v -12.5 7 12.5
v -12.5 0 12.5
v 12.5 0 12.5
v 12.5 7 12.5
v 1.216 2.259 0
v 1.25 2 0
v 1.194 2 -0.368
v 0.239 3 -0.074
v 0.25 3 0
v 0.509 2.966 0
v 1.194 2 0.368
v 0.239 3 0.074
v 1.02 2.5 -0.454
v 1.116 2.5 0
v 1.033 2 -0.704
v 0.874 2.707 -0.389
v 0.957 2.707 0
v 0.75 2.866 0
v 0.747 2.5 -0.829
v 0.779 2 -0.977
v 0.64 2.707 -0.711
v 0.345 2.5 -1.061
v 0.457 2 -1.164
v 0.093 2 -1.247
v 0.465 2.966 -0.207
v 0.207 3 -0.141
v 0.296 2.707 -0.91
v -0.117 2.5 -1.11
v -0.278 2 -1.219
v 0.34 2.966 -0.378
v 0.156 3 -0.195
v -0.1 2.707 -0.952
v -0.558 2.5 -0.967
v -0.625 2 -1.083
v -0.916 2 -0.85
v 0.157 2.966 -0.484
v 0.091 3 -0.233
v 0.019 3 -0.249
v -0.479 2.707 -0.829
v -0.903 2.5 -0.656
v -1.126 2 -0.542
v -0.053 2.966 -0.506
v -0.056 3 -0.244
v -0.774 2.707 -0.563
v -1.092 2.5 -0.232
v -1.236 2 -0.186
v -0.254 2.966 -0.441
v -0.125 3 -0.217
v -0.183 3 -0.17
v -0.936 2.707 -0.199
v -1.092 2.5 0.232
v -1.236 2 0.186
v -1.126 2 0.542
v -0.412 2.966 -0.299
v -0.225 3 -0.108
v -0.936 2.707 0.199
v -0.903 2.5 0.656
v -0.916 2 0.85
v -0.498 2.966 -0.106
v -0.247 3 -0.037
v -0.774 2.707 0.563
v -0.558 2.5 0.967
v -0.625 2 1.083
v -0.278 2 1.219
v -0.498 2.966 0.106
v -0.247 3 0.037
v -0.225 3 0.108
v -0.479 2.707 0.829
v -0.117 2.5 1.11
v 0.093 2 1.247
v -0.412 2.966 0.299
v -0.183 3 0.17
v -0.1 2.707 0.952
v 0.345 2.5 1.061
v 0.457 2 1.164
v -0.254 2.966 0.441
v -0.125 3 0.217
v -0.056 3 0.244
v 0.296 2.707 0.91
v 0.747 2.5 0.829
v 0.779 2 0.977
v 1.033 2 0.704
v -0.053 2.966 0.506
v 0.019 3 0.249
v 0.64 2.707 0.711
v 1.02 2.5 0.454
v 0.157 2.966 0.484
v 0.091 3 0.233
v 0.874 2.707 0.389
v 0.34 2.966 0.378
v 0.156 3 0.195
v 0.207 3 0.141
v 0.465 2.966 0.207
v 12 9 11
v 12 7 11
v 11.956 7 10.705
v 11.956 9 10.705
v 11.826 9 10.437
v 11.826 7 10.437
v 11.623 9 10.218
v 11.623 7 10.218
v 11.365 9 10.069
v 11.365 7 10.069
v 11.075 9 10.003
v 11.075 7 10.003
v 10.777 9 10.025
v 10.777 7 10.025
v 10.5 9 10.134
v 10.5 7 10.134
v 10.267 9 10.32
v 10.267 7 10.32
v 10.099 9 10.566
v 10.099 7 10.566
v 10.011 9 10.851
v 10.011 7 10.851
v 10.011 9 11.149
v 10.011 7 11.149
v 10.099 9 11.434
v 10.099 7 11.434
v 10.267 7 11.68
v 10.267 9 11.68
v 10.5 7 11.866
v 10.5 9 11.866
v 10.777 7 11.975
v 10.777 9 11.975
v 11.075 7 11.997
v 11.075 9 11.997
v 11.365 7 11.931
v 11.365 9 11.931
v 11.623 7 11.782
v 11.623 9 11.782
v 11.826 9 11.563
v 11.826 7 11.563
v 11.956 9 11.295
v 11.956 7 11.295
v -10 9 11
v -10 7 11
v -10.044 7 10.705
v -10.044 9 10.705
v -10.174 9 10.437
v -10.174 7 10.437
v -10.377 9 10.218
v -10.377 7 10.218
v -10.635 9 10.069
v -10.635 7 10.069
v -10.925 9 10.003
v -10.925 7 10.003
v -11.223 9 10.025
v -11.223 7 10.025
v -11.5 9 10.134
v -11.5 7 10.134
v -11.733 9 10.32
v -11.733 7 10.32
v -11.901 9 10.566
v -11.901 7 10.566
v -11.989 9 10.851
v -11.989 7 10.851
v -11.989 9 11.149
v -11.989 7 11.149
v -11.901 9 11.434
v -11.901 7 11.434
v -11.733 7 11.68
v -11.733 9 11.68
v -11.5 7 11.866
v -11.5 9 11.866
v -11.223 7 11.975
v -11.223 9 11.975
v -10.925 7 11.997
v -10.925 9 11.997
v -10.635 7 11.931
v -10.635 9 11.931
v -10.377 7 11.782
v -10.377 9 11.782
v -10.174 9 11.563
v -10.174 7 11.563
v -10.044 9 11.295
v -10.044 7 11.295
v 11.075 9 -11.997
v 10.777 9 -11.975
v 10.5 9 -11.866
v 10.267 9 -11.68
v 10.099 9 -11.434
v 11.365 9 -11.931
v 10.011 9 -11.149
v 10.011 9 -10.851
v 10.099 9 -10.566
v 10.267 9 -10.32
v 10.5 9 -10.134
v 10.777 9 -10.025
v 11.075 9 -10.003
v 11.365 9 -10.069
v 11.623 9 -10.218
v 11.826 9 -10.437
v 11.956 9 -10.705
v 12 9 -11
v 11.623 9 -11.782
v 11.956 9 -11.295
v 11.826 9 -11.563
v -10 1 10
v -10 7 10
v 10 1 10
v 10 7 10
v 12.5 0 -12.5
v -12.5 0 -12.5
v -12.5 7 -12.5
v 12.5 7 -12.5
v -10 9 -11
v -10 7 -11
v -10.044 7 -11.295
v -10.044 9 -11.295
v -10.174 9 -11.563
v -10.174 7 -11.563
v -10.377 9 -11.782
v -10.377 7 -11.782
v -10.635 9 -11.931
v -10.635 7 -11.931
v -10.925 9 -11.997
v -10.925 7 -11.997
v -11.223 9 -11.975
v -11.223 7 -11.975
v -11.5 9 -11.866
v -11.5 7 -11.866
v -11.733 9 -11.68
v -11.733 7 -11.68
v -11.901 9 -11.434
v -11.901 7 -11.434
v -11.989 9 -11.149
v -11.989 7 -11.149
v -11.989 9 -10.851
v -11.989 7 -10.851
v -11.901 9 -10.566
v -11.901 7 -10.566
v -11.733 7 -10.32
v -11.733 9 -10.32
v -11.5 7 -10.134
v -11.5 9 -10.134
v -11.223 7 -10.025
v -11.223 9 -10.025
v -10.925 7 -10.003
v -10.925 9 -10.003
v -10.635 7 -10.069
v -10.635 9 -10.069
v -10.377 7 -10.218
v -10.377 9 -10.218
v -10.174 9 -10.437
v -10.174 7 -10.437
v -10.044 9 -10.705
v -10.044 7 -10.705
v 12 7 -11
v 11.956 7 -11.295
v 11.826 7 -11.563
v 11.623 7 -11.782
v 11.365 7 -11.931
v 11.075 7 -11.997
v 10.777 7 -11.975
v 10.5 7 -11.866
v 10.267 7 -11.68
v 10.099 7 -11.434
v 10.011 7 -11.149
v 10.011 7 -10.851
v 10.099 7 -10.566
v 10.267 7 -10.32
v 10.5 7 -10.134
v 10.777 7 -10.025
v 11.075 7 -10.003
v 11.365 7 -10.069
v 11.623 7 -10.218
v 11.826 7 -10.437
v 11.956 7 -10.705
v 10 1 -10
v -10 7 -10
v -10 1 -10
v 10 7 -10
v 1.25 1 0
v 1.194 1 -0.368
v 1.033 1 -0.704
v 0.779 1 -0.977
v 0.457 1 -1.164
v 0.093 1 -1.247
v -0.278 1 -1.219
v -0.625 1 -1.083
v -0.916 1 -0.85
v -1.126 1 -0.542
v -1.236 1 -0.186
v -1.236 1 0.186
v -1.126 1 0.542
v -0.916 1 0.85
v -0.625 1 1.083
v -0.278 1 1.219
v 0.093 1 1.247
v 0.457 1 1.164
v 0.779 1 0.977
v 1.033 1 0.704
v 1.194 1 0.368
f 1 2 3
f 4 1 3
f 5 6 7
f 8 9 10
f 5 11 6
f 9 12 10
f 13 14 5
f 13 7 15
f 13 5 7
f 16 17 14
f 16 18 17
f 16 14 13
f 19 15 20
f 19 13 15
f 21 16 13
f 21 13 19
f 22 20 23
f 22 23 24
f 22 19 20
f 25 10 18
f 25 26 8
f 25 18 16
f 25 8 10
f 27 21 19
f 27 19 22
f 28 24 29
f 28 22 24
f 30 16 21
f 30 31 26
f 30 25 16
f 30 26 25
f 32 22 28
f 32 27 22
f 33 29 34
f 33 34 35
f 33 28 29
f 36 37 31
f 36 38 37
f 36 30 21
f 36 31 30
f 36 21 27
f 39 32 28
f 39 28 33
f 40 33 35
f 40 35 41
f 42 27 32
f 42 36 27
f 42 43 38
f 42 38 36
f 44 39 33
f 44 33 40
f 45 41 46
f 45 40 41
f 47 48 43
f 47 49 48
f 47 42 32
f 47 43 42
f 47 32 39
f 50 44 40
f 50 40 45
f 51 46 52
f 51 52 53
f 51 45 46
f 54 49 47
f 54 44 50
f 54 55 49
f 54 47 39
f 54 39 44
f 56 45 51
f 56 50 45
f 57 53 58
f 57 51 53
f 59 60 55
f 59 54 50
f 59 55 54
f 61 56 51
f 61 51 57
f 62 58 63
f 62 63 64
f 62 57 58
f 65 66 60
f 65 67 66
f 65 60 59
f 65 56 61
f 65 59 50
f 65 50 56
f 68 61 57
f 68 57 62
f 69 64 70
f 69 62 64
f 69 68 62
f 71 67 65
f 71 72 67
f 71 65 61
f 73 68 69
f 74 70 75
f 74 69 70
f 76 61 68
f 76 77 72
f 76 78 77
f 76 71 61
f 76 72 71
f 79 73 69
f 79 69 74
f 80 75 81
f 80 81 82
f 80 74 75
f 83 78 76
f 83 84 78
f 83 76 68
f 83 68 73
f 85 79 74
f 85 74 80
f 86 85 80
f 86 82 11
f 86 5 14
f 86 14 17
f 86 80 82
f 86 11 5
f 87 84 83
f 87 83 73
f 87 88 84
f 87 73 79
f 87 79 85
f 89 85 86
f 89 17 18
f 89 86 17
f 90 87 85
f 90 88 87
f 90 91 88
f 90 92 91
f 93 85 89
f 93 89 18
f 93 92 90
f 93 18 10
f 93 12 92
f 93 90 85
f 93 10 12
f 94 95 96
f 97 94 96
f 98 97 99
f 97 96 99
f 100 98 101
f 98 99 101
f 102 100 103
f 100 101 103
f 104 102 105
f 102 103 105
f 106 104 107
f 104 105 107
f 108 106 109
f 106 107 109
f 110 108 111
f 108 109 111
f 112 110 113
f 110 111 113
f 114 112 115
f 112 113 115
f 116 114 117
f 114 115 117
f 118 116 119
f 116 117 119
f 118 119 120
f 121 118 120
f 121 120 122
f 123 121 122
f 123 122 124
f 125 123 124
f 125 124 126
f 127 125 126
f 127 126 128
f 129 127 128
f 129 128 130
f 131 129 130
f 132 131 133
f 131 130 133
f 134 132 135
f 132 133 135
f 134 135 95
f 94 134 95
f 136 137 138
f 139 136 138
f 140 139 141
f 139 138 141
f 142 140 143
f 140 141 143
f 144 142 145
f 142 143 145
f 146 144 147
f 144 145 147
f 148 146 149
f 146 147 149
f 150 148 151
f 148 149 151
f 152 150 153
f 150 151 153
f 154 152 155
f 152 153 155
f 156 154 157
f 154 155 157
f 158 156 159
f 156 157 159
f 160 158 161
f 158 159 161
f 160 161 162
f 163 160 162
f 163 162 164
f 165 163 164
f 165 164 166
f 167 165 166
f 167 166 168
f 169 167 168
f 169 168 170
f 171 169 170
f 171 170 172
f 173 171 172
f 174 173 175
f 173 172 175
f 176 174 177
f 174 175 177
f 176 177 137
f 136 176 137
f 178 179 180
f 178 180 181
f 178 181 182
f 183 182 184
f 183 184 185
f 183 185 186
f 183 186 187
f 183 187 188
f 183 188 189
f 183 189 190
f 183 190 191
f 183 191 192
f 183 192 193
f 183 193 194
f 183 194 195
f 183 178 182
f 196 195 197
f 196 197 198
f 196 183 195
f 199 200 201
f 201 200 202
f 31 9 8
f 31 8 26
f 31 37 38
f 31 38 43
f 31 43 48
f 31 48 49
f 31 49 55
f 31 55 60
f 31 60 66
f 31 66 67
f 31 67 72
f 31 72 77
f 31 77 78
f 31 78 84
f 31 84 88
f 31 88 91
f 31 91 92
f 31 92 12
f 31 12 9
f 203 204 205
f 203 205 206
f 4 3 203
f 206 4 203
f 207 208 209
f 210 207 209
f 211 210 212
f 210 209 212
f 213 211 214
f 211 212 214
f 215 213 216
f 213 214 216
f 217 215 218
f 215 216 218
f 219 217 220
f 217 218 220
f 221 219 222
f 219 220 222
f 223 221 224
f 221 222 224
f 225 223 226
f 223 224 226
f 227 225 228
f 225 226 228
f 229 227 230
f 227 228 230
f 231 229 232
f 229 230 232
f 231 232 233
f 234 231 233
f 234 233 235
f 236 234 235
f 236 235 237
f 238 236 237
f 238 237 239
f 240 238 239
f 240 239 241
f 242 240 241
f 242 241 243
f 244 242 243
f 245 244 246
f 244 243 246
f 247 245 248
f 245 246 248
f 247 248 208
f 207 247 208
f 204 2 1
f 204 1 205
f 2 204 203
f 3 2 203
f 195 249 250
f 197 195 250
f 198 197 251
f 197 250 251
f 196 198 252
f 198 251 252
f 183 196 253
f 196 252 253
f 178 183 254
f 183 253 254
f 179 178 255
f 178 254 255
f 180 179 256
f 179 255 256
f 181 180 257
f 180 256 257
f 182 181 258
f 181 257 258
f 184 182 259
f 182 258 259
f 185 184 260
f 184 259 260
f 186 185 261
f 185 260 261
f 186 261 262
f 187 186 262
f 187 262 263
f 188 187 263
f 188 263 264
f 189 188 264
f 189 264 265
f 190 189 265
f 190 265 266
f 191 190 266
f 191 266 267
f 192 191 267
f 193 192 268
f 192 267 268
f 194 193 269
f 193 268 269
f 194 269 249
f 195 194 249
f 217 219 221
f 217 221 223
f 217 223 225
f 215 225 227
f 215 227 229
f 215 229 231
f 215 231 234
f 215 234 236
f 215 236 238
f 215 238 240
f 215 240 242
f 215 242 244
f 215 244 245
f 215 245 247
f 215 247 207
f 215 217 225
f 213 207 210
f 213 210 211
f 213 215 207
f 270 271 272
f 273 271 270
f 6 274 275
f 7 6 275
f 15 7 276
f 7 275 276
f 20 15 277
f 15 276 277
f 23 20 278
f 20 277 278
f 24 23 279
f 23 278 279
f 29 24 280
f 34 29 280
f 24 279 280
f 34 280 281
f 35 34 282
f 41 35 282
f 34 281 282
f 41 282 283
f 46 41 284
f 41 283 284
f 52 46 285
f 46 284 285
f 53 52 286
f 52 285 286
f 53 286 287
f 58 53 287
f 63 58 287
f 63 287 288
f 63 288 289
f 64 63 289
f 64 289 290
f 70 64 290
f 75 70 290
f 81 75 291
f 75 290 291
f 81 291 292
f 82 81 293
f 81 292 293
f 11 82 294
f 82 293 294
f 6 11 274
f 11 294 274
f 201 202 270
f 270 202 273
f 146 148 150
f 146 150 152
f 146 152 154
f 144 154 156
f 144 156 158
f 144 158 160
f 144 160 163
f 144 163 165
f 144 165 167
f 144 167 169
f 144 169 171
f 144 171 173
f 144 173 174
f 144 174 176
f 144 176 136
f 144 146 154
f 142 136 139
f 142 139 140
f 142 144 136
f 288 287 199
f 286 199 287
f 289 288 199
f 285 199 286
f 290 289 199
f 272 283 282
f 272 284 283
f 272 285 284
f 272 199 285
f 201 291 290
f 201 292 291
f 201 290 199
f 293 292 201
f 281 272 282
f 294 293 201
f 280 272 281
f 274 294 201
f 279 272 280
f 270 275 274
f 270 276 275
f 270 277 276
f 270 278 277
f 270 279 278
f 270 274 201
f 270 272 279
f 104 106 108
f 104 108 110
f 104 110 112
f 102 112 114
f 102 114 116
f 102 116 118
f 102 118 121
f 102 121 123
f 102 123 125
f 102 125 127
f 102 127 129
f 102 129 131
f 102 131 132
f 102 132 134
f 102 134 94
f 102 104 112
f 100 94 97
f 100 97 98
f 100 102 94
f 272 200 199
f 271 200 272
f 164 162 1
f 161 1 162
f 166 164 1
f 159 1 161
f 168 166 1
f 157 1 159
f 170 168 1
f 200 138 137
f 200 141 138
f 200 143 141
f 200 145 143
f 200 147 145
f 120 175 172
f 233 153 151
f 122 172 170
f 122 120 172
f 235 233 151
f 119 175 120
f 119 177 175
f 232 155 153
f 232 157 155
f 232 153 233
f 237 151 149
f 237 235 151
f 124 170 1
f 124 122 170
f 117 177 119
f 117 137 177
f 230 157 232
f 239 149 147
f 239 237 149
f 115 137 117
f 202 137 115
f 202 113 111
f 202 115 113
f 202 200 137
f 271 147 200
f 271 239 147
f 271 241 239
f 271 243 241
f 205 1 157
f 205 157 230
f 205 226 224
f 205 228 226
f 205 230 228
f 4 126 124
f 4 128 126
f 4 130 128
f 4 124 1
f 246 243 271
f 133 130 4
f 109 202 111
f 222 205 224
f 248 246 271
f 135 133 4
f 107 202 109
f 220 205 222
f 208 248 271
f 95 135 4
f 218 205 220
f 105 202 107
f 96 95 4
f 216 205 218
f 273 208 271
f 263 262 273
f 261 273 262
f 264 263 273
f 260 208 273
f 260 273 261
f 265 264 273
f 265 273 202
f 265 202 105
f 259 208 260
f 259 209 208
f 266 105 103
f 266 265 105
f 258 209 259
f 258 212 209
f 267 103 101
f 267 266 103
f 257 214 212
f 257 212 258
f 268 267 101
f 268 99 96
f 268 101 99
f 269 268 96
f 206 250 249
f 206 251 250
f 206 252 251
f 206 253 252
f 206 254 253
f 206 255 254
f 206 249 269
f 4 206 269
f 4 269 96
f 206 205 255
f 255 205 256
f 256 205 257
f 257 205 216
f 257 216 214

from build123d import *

# Parameters (mm, degrees)
SKETCH1_W           = 25
SKETCH1_H           = 25
BOSS_EXTRUDE1_DEPTH = 7
SKETCH2_W           = 20
SKETCH2_H           = 20
CUT_EXTRUDE1_DEPTH  = 6
SKETCH3_R           = 1.25
BOSS_EXTRUDE2_DEPTH = 2
FILLET1_R           = 1
SKETCH4_R           = 1
BOSS_EXTRUDE3_DEPTH = 2


with BuildPart() as part:
    # Sketch1 → Boss-Extrude1 (new body)
    with BuildSketch(Plane(origin=(0, 0, 0), x_dir=(1, 0, 0), z_dir=(0, 1, 0))):
        Rectangle(SKETCH1_W, SKETCH1_H)
    extrude(amount=BOSS_EXTRUDE1_DEPTH)

    # Sketch2 → Cut-Extrude1 (cut)
    with BuildSketch(Plane(origin=(0, 7, 0), x_dir=(1, 0, 0), z_dir=(0, 1, 0))):
        Rectangle(SKETCH2_W, SKETCH2_H)
    extrude(amount=-CUT_EXTRUDE1_DEPTH, mode=Mode.SUBTRACT)

    # Sketch3 → Boss-Extrude2 (add)
    with BuildSketch(Plane(origin=(0, 1, 0), x_dir=(1, 0, 0), z_dir=(0, 1, 0))):
        Circle(SKETCH3_R)
    extrude(amount=BOSS_EXTRUDE2_DEPTH)

    # Fillet1
    fillet1_edges = [part.edges().sort_by_distance(p)[0] for p in [
        (-1.25, 3, 0),
    ]]
    fillet(fillet1_edges, radius=FILLET1_R)

    # Sketch4 → Boss-Extrude3 (add)
    with BuildSketch(Plane(origin=(0, 7, 0), x_dir=(1, 0, 0), z_dir=(0, 1, 0))):
        with Locations((-11, 11)):
            Circle(SKETCH4_R)
        with Locations((11, 11)):
            Circle(SKETCH4_R)
        with Locations((11, -11)):
            Circle(SKETCH4_R)
        with Locations((-11, -11)):
            Circle(SKETCH4_R)
    extrude(amount=BOSS_EXTRUDE3_DEPTH)


solid = part.part
